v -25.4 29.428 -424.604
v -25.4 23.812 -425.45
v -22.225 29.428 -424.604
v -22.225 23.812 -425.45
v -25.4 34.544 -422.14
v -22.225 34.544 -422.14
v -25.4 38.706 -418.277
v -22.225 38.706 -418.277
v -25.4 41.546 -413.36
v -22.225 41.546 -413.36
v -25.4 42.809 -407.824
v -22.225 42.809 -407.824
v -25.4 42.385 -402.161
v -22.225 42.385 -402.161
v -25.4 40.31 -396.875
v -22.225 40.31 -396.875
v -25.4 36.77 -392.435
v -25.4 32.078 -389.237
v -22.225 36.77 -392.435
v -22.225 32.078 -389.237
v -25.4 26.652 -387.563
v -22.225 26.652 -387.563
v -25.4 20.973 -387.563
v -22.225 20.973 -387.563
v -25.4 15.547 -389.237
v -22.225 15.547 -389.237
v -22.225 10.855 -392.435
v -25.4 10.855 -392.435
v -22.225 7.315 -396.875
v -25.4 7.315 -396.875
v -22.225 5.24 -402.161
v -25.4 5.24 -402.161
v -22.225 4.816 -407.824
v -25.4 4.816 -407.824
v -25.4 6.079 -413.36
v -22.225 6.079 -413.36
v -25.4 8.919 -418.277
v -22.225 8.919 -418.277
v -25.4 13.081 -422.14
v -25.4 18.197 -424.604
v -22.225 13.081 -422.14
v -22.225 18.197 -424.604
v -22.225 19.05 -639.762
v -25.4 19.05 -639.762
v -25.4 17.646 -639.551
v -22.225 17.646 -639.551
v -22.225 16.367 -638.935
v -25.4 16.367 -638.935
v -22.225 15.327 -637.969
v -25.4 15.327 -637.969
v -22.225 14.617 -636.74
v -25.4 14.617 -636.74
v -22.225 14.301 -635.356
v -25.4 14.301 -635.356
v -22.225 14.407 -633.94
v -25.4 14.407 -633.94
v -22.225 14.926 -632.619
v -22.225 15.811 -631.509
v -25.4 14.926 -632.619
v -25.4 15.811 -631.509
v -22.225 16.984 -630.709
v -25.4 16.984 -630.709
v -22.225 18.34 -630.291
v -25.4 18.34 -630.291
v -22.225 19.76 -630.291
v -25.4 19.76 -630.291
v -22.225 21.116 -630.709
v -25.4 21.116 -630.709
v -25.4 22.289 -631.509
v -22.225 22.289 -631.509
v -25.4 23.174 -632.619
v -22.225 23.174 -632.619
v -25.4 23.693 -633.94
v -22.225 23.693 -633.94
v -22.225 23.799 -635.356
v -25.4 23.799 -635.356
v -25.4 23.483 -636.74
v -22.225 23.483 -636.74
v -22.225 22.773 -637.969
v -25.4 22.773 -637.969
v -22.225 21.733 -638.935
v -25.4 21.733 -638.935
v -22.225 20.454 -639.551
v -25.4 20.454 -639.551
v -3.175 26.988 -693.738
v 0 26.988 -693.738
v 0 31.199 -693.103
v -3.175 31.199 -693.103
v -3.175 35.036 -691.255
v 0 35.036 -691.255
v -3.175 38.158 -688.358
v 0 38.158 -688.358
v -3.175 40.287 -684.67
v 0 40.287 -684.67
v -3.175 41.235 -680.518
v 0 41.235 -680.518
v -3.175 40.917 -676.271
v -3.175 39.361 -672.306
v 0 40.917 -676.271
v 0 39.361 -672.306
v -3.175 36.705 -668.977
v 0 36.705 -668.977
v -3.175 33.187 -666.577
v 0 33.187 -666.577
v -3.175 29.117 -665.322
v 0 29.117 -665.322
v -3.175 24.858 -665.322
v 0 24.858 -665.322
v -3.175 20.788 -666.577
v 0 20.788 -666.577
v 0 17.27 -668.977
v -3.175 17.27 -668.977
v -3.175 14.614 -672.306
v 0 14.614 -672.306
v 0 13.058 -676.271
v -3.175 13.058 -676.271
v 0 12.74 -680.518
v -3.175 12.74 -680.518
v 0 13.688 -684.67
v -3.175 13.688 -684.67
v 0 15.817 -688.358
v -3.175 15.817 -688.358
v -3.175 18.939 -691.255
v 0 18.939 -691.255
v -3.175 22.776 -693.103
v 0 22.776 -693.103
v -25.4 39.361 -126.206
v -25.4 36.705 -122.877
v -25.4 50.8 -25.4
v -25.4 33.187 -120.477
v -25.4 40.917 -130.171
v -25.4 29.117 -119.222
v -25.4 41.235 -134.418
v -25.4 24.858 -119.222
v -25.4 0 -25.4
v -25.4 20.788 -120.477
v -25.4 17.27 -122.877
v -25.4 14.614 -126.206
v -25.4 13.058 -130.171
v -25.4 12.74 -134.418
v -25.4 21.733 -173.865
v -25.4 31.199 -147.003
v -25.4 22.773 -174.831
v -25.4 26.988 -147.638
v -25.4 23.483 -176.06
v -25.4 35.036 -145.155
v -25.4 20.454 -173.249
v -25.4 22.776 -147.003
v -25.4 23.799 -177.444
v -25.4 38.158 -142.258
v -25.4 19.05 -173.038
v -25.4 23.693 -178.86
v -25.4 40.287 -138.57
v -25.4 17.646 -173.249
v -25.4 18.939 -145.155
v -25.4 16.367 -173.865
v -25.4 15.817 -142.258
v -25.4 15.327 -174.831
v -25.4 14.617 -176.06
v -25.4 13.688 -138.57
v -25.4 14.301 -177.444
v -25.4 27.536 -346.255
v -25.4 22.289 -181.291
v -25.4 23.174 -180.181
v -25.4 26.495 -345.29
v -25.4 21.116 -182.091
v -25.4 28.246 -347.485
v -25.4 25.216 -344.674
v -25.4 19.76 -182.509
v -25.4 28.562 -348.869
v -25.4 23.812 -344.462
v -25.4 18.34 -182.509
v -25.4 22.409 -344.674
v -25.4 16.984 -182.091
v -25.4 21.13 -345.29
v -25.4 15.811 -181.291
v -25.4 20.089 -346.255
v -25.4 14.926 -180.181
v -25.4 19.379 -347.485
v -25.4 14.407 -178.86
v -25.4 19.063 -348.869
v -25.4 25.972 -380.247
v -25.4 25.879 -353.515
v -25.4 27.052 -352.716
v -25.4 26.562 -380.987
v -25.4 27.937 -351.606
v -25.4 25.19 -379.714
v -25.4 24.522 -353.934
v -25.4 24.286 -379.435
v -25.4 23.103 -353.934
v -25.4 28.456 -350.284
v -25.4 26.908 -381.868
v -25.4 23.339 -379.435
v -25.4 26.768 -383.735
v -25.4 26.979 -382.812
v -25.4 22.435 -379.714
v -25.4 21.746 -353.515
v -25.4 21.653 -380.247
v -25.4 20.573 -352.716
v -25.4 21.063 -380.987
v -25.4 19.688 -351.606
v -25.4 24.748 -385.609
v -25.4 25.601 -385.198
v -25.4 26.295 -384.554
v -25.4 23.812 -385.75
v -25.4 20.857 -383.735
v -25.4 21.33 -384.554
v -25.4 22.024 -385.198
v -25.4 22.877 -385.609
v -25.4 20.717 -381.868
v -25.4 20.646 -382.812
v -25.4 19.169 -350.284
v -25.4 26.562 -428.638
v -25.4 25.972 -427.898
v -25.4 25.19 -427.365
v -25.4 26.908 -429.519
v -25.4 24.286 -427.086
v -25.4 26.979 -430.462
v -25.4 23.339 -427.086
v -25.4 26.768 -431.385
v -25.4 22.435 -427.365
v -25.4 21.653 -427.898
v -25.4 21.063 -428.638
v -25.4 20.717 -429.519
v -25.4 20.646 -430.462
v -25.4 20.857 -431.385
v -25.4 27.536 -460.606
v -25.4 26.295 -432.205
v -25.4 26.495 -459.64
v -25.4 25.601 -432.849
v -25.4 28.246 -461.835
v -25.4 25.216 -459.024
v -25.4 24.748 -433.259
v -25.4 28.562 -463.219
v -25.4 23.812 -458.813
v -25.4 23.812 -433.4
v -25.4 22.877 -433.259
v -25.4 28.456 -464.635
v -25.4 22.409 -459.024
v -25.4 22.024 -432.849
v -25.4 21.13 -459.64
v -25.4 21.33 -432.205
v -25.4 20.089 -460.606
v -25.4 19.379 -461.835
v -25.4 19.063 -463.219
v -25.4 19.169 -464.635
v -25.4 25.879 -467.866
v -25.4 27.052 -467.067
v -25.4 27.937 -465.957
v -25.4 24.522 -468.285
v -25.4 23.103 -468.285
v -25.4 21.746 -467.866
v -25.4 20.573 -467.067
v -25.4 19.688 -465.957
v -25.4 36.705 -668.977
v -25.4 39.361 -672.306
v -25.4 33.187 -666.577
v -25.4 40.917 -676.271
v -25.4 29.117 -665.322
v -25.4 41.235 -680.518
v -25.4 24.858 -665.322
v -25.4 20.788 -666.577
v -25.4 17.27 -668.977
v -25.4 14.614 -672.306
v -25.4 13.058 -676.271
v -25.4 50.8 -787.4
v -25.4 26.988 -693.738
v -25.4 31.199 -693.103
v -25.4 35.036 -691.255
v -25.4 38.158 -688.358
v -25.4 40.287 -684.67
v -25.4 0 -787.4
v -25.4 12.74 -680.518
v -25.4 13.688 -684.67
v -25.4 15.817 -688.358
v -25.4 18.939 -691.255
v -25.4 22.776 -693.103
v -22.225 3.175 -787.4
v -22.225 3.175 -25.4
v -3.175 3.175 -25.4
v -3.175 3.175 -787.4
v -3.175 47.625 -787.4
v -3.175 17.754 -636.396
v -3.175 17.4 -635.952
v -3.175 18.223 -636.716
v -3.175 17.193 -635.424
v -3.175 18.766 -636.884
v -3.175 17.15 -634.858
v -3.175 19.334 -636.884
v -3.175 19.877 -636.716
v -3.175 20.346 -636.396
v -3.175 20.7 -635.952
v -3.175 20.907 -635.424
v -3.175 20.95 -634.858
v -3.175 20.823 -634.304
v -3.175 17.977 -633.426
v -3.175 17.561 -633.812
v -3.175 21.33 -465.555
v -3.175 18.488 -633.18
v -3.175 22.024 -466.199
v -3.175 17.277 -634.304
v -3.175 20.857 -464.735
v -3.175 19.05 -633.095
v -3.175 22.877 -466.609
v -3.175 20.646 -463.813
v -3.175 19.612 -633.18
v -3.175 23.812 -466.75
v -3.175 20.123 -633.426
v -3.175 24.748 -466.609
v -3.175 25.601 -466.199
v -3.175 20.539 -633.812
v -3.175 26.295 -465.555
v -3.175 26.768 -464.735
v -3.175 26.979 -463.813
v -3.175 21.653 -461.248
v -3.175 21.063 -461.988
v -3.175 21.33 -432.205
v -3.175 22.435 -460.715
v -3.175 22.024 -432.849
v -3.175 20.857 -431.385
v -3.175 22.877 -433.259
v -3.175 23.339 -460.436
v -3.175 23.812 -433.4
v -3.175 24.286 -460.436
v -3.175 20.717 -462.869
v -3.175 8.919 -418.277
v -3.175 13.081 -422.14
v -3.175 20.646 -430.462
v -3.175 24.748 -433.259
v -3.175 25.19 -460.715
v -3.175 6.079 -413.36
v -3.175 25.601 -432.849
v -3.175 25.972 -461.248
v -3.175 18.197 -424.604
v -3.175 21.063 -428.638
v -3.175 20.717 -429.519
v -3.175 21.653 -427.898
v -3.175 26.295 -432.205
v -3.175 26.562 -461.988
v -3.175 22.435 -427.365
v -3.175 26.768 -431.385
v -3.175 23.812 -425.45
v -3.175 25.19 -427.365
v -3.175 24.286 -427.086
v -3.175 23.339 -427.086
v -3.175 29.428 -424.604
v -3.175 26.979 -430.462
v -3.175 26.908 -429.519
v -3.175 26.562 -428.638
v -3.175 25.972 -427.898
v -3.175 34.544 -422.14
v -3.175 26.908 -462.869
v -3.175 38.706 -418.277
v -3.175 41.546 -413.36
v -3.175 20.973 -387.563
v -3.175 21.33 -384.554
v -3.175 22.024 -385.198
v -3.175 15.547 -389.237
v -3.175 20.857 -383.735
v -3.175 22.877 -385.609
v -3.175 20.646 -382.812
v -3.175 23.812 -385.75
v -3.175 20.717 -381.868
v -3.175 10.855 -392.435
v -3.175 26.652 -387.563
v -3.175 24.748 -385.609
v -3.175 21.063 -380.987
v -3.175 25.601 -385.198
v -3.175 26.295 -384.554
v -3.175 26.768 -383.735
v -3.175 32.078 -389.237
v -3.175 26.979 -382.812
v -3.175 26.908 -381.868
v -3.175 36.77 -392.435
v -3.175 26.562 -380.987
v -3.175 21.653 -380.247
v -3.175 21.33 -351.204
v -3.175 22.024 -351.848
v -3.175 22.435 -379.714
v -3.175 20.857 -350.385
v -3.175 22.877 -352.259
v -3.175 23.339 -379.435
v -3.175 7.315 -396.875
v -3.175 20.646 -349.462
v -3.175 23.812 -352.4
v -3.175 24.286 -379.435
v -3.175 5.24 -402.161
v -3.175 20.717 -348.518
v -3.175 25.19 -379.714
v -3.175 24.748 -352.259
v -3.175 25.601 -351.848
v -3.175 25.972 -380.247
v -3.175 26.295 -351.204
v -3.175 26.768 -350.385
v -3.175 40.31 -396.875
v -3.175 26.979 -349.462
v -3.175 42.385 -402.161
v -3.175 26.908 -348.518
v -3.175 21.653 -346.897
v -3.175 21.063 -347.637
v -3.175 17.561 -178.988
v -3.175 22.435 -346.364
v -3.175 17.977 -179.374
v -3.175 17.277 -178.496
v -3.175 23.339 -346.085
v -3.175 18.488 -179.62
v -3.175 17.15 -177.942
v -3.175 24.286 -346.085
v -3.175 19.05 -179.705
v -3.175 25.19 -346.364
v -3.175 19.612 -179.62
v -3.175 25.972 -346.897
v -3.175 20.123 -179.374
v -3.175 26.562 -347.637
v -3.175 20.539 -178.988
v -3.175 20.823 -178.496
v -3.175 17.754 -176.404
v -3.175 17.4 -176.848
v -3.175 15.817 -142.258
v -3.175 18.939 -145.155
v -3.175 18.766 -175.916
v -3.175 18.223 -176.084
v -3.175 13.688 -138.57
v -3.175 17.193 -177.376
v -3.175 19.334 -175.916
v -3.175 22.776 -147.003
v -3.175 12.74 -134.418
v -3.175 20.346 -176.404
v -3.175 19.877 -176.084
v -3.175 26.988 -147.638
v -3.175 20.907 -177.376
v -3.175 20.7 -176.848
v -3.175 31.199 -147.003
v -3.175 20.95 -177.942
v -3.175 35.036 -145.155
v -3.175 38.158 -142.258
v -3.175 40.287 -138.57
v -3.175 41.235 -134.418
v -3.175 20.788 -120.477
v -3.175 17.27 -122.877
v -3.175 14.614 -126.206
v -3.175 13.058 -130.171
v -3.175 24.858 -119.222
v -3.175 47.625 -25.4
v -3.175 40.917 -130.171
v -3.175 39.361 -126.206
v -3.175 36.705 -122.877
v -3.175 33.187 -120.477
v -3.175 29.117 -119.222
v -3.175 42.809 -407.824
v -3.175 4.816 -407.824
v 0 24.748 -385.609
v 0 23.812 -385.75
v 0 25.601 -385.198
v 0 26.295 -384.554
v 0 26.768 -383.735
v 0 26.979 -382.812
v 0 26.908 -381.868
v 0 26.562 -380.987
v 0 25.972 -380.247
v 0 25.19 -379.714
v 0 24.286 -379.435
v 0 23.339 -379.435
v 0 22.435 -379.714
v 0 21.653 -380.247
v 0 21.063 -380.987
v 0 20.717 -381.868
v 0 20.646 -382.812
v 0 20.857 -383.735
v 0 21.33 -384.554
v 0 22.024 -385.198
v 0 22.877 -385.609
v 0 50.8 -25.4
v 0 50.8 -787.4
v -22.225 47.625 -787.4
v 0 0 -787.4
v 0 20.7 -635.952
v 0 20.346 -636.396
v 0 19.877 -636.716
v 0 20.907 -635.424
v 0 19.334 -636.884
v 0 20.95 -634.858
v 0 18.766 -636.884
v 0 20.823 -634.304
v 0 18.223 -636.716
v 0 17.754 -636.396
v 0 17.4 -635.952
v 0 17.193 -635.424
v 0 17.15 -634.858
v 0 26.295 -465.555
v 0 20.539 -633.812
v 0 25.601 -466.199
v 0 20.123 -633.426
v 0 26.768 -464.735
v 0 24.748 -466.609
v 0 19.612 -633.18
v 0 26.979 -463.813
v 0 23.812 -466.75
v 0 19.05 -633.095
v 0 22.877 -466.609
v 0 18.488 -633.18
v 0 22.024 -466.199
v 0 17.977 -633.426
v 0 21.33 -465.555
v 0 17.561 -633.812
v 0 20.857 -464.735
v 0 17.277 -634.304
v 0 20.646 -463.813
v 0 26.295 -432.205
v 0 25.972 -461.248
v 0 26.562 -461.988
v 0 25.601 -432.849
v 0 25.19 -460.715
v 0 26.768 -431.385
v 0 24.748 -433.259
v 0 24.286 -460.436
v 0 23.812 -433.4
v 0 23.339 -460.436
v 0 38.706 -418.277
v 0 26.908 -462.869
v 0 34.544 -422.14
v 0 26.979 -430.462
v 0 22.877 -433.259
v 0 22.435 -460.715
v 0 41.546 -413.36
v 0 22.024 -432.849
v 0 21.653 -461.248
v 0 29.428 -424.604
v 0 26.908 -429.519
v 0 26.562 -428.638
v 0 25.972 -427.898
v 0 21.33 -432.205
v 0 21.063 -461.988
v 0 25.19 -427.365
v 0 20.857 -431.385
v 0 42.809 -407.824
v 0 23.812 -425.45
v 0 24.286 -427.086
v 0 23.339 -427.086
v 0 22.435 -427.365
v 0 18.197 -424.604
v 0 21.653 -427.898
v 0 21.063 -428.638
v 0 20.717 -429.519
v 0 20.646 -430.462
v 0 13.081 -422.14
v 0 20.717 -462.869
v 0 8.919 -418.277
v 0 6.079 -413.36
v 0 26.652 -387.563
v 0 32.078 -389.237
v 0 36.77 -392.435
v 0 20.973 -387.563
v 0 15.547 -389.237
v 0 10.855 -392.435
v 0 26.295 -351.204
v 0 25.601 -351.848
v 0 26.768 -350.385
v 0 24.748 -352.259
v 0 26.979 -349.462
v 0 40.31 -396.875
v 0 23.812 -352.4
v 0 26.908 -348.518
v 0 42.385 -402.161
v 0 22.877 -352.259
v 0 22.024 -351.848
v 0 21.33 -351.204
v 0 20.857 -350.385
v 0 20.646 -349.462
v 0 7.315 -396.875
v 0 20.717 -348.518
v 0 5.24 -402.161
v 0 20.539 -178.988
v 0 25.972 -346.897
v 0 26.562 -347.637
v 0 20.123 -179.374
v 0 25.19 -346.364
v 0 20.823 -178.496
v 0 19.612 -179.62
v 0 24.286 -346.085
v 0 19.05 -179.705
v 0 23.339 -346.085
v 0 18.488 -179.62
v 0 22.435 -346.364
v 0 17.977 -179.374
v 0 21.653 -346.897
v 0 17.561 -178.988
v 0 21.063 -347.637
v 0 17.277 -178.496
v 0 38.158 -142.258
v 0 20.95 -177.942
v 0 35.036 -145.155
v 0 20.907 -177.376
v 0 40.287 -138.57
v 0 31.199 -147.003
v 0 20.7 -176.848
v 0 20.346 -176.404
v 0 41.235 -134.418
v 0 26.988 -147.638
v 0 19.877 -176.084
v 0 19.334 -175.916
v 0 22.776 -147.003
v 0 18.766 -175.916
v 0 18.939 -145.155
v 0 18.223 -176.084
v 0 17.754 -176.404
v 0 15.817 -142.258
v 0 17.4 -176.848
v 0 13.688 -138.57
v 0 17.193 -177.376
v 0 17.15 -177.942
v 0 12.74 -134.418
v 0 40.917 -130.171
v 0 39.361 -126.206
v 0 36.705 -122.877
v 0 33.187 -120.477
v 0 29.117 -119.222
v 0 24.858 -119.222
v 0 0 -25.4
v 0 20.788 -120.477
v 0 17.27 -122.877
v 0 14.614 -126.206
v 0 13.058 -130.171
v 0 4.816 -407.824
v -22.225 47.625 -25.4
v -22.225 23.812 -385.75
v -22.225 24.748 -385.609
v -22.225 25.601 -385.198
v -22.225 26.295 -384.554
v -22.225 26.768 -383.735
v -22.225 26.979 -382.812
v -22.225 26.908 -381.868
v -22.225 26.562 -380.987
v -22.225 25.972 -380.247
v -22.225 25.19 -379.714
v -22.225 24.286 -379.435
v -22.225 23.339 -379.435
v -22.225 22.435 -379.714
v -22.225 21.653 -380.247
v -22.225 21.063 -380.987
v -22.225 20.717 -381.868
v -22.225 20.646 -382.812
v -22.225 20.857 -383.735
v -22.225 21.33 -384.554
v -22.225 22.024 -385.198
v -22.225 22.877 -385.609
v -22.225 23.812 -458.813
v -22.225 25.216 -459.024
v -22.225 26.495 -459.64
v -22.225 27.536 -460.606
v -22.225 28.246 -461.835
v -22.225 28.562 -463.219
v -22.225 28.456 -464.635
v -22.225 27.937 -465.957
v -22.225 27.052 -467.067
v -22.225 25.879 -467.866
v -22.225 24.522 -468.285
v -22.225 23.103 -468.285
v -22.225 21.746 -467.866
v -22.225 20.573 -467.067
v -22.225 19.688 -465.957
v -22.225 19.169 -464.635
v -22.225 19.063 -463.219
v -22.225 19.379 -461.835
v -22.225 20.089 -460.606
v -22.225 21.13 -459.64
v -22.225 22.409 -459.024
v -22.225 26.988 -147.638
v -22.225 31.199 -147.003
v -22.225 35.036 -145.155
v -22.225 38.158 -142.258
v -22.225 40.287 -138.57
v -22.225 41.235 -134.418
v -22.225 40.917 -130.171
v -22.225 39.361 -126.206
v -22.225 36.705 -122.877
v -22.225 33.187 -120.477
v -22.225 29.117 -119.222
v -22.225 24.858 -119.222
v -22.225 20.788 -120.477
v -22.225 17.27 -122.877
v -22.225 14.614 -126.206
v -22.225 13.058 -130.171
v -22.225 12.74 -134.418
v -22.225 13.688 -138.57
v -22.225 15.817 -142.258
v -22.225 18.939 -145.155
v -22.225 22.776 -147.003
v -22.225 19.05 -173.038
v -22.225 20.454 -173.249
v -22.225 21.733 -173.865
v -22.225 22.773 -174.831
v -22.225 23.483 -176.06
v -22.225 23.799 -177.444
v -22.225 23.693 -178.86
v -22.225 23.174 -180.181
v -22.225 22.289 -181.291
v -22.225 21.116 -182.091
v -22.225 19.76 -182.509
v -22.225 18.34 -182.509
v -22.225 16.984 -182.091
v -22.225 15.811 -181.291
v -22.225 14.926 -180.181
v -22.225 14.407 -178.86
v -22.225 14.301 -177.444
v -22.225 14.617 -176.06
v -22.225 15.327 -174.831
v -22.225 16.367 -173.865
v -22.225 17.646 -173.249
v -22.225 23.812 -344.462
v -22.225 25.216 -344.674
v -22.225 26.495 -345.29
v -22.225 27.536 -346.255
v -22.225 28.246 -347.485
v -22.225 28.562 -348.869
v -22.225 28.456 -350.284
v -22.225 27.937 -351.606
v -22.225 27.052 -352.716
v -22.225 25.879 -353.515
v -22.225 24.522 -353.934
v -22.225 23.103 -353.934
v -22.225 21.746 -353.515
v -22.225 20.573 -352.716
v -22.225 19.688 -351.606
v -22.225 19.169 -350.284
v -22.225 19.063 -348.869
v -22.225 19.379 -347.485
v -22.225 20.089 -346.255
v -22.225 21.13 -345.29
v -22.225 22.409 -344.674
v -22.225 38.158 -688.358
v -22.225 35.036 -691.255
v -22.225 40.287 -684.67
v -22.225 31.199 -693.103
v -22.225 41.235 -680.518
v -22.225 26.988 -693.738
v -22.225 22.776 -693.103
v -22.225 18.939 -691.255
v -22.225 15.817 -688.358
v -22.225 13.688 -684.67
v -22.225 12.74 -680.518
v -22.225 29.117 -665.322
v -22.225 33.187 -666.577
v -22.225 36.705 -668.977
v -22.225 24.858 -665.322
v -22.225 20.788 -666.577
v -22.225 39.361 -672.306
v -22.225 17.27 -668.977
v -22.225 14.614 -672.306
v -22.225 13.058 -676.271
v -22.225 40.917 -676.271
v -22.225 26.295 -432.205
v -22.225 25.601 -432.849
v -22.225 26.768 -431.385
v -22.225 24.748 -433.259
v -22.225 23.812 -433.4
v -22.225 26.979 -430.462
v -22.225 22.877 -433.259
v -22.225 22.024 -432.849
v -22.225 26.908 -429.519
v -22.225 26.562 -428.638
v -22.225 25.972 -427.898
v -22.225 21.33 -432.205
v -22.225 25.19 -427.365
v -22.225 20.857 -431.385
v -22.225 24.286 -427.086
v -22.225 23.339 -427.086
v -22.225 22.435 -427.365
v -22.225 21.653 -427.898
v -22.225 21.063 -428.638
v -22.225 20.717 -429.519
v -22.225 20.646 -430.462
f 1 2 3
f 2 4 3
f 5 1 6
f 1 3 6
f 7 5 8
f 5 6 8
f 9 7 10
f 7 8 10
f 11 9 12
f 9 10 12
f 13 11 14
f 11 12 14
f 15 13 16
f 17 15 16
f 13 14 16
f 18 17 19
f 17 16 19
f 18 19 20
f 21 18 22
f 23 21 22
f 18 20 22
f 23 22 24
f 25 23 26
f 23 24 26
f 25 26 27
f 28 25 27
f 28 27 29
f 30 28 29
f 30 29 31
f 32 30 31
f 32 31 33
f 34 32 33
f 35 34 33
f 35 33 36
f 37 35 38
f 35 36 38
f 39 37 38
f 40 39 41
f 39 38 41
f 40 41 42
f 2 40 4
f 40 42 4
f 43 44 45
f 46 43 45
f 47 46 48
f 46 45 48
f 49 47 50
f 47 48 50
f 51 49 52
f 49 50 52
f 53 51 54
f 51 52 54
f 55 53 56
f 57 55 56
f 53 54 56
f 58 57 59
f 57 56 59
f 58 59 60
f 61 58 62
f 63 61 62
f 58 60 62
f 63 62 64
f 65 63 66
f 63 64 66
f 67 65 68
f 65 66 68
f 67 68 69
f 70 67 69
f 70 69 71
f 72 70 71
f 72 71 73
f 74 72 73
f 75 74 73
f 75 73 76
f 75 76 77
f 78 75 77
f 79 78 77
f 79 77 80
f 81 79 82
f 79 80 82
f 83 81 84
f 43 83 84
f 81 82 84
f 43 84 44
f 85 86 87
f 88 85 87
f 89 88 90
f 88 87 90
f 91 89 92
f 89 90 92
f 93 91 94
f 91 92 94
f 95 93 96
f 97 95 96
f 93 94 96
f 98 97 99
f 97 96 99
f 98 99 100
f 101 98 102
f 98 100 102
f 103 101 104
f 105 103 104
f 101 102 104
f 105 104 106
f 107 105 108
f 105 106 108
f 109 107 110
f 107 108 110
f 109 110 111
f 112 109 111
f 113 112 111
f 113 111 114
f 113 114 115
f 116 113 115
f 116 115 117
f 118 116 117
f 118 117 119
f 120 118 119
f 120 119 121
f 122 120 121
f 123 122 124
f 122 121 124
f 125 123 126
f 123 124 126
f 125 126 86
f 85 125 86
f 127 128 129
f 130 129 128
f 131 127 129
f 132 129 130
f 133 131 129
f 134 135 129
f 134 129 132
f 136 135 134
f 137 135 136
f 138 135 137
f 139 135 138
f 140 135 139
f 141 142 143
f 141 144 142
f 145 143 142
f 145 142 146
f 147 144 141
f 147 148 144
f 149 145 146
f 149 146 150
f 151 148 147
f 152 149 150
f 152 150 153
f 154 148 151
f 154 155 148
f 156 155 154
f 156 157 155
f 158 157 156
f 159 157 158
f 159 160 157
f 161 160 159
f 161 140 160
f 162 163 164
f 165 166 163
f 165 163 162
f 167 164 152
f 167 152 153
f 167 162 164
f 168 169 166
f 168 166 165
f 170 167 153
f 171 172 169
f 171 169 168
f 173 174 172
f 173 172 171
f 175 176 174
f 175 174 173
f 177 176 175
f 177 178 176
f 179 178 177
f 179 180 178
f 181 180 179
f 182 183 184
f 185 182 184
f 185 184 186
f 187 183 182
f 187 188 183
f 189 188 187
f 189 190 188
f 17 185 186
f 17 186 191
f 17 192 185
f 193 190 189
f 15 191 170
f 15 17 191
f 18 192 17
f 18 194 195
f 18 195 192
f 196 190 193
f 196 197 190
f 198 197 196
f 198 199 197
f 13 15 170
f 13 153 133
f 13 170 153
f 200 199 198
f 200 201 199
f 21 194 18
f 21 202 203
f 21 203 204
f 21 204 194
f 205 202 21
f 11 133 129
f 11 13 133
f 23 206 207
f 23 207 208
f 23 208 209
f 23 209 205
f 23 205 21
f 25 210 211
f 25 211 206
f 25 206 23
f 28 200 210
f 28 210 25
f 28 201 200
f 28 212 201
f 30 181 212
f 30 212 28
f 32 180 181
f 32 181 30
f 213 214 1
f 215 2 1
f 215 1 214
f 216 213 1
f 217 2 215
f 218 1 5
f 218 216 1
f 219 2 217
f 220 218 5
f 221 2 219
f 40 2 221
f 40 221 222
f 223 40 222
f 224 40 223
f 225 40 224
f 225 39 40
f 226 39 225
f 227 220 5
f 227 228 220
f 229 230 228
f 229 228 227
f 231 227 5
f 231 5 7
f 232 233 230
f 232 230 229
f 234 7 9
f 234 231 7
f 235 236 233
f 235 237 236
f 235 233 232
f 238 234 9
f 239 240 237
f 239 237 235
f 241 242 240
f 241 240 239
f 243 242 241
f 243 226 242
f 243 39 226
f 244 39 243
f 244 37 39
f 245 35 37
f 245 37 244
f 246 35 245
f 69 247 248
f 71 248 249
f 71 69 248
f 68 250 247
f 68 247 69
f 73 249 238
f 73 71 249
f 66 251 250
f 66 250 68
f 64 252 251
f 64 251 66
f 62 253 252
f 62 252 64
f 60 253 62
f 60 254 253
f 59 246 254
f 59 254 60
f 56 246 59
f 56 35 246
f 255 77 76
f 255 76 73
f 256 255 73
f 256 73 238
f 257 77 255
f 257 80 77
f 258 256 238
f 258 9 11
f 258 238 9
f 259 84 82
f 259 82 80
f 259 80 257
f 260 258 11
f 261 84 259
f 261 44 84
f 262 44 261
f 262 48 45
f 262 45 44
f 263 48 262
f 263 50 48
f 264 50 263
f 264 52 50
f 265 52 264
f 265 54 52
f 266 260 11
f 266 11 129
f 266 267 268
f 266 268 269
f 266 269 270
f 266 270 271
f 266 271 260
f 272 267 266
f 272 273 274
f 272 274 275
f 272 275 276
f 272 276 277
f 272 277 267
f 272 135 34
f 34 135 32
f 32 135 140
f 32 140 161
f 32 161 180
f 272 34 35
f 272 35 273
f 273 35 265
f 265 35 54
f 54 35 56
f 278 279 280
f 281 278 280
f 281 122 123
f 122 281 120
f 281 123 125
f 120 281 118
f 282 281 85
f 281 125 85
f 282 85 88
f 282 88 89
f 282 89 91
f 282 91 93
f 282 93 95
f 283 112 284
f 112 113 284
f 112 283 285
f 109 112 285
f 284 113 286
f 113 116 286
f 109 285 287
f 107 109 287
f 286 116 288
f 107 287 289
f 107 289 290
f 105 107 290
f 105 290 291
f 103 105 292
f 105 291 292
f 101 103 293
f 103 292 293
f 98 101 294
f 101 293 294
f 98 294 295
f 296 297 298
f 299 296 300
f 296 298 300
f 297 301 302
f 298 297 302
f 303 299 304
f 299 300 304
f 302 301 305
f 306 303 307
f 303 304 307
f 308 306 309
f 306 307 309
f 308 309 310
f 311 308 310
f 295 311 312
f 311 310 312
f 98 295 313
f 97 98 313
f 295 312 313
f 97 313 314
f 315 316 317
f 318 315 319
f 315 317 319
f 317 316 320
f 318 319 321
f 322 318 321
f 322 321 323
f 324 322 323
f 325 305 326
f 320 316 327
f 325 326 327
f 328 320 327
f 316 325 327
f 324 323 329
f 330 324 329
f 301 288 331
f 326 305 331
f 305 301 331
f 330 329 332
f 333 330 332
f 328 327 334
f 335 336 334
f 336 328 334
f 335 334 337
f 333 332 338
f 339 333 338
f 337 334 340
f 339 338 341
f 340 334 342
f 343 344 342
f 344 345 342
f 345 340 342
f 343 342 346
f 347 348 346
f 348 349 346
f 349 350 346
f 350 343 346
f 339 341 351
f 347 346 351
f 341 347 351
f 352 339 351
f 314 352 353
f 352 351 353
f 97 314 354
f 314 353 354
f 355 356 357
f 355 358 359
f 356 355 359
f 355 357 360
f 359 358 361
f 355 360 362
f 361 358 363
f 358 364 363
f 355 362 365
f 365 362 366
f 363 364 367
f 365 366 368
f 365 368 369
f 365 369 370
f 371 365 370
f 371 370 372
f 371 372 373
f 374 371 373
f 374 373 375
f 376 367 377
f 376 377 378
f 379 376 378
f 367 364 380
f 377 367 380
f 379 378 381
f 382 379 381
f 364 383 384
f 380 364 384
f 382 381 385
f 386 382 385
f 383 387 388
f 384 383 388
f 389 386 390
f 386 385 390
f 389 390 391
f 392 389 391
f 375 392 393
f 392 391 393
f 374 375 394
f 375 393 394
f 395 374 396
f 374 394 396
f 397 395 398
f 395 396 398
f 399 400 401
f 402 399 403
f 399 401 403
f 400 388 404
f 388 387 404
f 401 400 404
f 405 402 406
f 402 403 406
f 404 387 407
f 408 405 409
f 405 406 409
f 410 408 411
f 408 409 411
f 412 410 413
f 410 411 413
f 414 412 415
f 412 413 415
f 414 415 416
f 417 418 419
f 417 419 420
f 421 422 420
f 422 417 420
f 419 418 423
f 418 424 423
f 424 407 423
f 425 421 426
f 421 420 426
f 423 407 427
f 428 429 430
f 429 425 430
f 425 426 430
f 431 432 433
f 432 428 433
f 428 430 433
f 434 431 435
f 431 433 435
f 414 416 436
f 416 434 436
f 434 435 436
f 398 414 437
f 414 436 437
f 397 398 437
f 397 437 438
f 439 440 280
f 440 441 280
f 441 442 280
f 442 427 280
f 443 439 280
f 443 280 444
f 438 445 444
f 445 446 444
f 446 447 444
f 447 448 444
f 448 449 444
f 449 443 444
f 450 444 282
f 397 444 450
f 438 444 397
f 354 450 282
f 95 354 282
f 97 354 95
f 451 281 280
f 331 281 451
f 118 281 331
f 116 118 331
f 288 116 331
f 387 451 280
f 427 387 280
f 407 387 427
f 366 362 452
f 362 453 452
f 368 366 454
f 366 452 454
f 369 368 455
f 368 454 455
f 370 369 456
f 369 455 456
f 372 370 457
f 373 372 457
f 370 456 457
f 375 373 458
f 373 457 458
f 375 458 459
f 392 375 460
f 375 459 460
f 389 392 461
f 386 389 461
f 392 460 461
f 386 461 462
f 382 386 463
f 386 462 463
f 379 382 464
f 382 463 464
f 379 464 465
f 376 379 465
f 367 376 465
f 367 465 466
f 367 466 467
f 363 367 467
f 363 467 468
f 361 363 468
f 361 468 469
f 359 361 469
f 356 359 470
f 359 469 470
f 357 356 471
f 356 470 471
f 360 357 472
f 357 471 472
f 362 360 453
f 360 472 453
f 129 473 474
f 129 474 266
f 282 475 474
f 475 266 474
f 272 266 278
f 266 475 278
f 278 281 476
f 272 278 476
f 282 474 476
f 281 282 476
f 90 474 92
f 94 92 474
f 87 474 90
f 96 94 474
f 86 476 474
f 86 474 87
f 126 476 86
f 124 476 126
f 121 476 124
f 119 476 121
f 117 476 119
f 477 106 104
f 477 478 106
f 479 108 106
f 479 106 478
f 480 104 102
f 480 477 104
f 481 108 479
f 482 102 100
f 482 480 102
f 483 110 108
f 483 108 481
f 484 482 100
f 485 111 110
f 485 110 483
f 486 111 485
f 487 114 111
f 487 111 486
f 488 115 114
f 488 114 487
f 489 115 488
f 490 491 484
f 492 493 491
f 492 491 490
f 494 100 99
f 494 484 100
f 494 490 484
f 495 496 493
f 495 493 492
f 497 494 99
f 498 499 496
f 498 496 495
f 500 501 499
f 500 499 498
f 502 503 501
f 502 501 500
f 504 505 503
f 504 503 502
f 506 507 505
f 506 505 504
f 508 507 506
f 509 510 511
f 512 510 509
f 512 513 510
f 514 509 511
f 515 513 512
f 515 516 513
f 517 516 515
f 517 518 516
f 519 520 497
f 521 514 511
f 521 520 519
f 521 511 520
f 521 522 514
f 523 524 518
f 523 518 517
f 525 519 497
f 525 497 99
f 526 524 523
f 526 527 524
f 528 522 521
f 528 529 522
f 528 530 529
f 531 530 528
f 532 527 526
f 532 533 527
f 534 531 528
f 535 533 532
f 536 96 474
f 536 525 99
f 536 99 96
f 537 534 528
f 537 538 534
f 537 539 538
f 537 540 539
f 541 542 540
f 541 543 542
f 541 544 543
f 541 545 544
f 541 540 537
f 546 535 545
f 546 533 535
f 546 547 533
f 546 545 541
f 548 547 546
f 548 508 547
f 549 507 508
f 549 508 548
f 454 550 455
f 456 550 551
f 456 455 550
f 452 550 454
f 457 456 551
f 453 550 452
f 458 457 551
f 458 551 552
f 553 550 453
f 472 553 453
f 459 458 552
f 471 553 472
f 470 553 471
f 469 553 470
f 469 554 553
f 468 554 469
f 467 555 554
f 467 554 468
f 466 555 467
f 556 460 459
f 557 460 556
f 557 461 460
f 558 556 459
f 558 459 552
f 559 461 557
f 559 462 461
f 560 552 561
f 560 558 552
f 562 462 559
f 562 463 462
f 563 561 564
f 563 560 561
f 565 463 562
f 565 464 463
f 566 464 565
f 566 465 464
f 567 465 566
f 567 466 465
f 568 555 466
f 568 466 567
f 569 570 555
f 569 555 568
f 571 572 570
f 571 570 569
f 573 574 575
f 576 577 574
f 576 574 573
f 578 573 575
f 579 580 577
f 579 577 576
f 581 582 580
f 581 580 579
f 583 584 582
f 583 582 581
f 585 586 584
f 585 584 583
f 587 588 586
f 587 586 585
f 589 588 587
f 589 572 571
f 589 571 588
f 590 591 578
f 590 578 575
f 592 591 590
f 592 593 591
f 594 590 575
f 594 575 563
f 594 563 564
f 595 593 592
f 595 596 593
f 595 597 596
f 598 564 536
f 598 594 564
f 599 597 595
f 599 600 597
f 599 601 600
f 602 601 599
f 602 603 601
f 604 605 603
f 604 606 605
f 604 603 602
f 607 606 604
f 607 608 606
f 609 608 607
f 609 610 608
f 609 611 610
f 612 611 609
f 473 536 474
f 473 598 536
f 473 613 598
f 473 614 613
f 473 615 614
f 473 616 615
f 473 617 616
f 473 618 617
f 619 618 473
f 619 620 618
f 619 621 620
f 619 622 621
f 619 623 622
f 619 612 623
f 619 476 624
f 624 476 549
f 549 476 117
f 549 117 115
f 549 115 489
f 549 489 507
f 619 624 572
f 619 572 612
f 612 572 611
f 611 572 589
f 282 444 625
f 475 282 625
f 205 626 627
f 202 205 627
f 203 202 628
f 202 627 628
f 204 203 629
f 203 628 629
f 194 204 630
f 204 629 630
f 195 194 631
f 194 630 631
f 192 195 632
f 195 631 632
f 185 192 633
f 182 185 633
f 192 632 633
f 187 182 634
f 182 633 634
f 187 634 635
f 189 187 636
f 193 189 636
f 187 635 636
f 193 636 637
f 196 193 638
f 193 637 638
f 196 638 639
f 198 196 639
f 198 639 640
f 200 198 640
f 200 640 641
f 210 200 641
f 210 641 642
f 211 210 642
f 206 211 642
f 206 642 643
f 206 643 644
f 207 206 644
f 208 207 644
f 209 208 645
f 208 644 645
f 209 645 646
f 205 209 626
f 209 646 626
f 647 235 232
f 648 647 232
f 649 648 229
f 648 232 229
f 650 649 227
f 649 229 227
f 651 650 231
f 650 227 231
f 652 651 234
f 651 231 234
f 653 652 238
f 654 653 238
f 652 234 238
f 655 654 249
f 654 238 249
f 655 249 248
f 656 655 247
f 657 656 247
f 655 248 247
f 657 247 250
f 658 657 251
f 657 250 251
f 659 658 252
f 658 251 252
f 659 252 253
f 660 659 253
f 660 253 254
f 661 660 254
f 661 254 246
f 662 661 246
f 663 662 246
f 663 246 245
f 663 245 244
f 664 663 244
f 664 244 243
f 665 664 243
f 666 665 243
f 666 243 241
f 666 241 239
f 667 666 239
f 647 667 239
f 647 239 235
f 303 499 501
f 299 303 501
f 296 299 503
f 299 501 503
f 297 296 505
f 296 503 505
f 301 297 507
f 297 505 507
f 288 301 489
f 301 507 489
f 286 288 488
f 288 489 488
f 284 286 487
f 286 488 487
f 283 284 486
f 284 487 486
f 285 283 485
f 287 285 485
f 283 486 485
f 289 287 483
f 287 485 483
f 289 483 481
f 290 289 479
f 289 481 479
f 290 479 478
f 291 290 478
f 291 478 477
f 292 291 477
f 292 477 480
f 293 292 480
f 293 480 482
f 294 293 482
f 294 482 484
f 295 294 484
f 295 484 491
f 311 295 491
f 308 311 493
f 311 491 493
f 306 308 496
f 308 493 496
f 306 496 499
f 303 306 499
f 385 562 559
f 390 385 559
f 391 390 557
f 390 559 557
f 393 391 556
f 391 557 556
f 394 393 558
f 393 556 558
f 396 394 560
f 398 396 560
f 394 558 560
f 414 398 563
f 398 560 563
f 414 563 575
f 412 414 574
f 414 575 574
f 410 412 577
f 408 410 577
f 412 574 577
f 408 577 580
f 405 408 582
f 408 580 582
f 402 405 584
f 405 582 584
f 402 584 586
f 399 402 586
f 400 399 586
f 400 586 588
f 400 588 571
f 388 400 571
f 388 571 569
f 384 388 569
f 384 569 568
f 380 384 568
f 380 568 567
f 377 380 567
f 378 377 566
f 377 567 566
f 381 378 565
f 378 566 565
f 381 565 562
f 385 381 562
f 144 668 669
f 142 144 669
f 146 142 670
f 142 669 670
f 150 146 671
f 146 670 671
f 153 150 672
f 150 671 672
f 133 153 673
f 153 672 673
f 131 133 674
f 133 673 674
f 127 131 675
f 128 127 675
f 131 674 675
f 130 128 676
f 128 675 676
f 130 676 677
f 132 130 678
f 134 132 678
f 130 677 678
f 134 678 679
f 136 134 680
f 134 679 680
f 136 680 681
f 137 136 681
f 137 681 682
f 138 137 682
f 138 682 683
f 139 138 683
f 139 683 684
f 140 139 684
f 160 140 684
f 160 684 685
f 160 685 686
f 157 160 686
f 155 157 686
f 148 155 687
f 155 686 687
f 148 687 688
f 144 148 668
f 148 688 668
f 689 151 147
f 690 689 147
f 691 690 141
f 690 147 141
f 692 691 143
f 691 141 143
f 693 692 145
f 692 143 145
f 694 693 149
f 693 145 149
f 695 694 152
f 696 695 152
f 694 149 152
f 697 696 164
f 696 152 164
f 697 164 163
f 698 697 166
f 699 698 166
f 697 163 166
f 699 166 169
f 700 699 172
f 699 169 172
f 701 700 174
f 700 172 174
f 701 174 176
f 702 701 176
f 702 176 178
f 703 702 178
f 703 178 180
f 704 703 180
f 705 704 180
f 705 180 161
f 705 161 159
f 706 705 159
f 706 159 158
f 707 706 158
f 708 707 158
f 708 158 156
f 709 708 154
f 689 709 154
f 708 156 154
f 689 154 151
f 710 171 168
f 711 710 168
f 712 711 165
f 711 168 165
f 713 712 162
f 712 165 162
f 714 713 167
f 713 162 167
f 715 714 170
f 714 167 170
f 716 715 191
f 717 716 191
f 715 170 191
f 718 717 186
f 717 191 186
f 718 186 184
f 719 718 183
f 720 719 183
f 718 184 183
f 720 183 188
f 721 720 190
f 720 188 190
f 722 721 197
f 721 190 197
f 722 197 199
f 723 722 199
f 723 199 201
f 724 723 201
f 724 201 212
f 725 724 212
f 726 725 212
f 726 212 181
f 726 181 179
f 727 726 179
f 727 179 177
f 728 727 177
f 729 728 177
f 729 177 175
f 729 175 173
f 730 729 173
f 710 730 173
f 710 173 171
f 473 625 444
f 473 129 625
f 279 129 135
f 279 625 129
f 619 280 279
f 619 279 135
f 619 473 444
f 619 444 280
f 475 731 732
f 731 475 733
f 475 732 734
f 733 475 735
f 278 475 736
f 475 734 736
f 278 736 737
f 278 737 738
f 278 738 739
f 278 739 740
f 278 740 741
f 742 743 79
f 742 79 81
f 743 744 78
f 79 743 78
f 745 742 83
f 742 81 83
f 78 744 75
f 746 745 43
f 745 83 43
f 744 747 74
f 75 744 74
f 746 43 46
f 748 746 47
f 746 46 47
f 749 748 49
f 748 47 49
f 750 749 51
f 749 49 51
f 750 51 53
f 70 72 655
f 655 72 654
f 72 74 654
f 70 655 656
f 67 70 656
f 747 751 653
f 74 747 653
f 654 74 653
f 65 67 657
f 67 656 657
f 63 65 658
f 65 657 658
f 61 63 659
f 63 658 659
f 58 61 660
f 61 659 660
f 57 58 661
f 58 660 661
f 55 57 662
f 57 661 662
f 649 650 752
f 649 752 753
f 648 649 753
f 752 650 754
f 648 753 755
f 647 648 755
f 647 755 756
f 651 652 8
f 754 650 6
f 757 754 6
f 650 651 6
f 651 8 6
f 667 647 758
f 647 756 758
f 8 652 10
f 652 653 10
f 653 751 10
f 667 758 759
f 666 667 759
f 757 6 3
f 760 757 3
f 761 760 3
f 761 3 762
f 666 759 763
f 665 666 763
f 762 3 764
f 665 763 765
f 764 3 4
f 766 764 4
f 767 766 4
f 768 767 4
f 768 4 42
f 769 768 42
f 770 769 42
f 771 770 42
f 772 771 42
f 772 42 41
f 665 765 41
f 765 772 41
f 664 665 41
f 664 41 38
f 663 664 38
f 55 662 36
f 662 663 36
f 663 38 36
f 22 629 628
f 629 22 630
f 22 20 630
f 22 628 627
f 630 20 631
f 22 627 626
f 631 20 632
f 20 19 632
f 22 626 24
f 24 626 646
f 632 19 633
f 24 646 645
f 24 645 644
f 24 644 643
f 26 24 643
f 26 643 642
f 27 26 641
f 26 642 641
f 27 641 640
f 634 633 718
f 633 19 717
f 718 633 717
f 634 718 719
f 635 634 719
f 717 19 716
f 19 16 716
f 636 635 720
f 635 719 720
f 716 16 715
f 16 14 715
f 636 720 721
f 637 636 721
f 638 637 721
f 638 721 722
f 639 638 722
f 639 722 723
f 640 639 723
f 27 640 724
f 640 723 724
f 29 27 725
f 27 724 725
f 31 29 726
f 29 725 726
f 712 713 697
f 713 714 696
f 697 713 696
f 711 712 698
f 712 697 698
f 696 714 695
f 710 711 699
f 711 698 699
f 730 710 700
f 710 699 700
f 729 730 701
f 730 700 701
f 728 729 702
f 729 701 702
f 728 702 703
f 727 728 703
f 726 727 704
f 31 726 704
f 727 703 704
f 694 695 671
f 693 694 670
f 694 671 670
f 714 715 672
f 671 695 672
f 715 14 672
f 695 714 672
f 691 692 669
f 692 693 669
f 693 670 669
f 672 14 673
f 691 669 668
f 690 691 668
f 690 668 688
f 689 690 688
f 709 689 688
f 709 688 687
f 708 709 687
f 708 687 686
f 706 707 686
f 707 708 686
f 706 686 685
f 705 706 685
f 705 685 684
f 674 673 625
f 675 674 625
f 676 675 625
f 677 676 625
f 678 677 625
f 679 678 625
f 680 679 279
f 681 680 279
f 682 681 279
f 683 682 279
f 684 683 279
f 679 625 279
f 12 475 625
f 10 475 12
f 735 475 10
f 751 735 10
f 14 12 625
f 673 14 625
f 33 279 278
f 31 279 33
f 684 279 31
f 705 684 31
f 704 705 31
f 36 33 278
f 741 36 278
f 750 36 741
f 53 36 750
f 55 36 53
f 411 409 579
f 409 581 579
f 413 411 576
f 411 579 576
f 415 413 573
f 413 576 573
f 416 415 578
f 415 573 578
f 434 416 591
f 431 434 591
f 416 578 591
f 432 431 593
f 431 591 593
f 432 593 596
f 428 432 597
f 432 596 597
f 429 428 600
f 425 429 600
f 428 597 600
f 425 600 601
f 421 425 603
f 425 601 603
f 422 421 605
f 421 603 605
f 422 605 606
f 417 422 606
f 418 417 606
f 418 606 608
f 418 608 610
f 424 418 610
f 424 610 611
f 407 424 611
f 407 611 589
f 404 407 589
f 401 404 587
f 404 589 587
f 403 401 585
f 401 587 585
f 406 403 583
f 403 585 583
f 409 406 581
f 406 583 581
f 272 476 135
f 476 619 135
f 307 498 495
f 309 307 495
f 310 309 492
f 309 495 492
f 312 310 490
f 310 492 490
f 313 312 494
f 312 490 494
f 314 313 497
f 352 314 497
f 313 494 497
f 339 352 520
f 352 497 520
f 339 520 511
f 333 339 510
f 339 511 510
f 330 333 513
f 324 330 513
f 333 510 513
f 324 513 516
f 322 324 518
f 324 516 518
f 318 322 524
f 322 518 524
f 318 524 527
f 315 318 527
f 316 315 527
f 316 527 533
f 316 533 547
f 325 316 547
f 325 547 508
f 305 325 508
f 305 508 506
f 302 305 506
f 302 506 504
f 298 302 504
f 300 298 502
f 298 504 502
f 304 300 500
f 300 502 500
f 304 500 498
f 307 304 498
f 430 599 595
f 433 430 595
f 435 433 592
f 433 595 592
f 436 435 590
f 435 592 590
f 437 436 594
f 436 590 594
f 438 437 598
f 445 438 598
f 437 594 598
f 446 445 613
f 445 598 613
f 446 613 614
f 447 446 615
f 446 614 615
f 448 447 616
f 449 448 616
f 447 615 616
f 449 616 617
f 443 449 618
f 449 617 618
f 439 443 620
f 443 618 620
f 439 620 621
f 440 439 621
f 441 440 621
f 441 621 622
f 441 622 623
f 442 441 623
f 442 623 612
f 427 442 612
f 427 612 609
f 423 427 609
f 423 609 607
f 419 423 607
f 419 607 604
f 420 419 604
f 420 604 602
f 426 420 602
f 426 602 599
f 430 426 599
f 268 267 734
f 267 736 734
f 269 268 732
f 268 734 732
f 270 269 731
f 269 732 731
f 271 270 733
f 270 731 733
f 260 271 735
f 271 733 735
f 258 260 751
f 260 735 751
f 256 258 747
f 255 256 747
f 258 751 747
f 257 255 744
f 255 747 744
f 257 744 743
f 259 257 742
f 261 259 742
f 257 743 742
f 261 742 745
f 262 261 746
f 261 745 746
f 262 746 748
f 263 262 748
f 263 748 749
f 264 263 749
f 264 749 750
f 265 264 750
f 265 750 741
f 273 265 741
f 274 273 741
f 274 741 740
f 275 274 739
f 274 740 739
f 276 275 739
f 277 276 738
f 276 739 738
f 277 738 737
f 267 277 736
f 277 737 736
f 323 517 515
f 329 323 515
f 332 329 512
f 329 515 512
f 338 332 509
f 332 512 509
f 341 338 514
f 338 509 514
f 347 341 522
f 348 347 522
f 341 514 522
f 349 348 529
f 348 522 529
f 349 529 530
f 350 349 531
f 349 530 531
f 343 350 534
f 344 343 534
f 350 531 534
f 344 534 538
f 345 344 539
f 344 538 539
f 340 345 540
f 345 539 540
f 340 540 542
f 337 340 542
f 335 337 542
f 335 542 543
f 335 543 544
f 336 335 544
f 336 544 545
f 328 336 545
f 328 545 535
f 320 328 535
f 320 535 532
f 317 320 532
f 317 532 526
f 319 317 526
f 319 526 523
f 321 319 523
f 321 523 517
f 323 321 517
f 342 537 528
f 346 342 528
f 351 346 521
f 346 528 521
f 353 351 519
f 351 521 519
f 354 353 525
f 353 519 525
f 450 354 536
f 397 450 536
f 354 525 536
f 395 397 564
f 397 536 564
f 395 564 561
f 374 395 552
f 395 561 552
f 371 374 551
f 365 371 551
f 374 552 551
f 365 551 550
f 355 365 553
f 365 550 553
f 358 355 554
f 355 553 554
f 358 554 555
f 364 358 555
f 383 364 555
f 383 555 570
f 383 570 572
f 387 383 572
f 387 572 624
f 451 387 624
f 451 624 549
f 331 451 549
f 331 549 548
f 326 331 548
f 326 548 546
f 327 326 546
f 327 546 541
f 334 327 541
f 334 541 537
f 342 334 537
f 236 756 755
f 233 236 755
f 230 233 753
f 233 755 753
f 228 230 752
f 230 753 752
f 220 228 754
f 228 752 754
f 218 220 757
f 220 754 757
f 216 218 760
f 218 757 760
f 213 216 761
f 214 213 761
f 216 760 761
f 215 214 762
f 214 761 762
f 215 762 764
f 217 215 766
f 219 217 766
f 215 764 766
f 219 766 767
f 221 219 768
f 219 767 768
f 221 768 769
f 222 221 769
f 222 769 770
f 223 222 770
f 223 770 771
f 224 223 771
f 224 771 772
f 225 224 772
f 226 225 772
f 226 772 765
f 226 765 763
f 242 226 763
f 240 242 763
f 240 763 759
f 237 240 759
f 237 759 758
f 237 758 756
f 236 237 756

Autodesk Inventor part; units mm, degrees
ref_plane "YZ Plane" through (0, 0, 0) normal (1, 0, 0) x (0, 1, 0)
ref_plane "XZ Plane" through (0, 0, 0) normal (0, 1, 0) x (-1, 0, 0)
sketch "Sketch1" plane through (0, 0, 0) normal (0, 1, 0) x (-1, 0, 0)
  point P0 (0, 0)
sketch "Sketch2" plane through (0, 0, 0) normal (0, 1, 0) x (-1, 0, 0)
  line L0 (0, 0) -> (25.4, 0)
  line L1 (25.4, 0) -> (25.4, -812.8)
  line L2 (25.4, -812.8) -> (0, -812.8)
  line L3 (0, -812.8) -> (0, 0)
  dimension "d0" = 812.8
  dimension "d1" = 25.4
extrude "Extrusion1" add sketch "Sketch2" along normal blind 50.8
sketch "Sketch3" plane through (0, 0, 0) normal (1, 0, 0) x (0, 0, -1)
  circle A0 centre (133.35, 26.9875) radius 14.2875
  line L0 (0, 0) -> (0, 50.8) projected
  line L1 (0, 50.8) -> (812.8, 50.8) projected
  circle A1 centre (679.45, 26.9875) radius 14.2875
  line L2 (812.8, 0) -> (812.8, 50.8) projected
  line L3 (812.8, 0) -> (0, 0) projected
  circle A2 centre (406.4, 23.8125) radius 19.05
  point P0 (406.4, 50.8)
  point P1 (406.4, 0)
  point P2 (406.4, 0)
  dimension "d4" = 28.575
  dimension "d5" = 133.35
  dimension "d6" = 23.8125
  dimension "d7" = 28.575
  dimension "d8" = 133.35
  dimension "d9" = 26.9875
  dimension "d10" = 38.1
  dimension "d11" = 26.9875
extrude "Extrusion2" cut sketch "Sketch3" against normal through all contours A0 | A1 | A2
sketch "Sketch4" plane through (-25.4, 0, 0) normal (0, 0, 1) x (1, 0, 0)
  line L0 (0, 50.8) -> (25.4, 50.8) projected
  line L1 (25.4, 0) -> (25.4, 50.8) projected
  line L2 (25.4, 0) -> (0, 0) projected
  line L3 (0, 0) -> (0, 50.8) projected
  line L4 (22.225, 47.625) -> (3.175, 47.625)
  line L5 (3.175, 47.625) -> (3.175, 3.175)
  line L6 (3.175, 3.175) -> (22.225, 3.175)
  line L7 (22.225, 3.175) -> (22.225, 47.625)
  dimension "d15" = 3.175
extrude "Extrusion3" cut sketch "Sketch4" against normal up to surface (812.8 mm away) contours L7 L6 L5 L4
sketch "Sketch5" plane through (0, 0, 0) normal (1, 0, 0) x (0, 0, -1)
  circle A0 centre (679.45, 26.9875) radius 14.2875 projected
  circle A1 centre (133.35, 26.9875) radius 14.2875 projected
  circle A2 centre (406.4, 23.8125) radius 19.05 projected
  line L0 (812.8, 0) -> (0, 0) projected
  line L1 (812.8, 0) -> (812.8, 50.8) projected
  line L2 (0, 50.8) -> (812.8, 50.8) projected
  line L3 (0, 0) -> (0, 50.8) projected
  line L4 (0, 50.8) -> (25.4, 50.8)
  line L5 (25.4, 50.8) -> (25.4, 0)
  line L6 (25.4, 0) -> (0, 0)
  line L7 (0, 0) -> (0, 50.8)
  line L8 (812.8, 0) -> (812.8, 50.8) projected
  line L9 (812.8, 0) -> (0, 0) projected
  line L10 (812.8, 50.8) -> (787.4, 50.8)
  line L11 (787.4, 50.8) -> (787.4, 0)
  line L12 (787.4, 0) -> (812.8, 0)
  line L13 (812.8, 0) -> (812.8, 50.8)
  dimension "d18" = 25.4
  dimension "d19" = 25.4
  dimension "d59" = 28.575
extrude "Extrusion4" cut sketch "Sketch5" against normal blind 25.4 contours L0 L11 L2 L1 | L0 L3 L2 L5
sketch "Sketch8" plane through (0, 0, -25.4) normal (1, 0, 0) x (0, 0, -1)
  point P0 (-25.4, 0)
sketch "Sketch9" plane through (0, 0, -25.4) normal (1, 0, 0) x (0, 0, -1)
  circle A0 centre (404.8252, 23.8125) radius 3.175
  circle A1 centre (381, 23.8125) radius 19.05 projected
  line L0 (0, 50.8) -> (762, 50.8) projected
  circle A2 centre (357.1748, 23.8125) radius 3.175
  circle A3 centre (438.1754, 23.8125) radius 3.175
  circle A4 centre (323.8246, 23.8125) radius 3.175
  point P0 (-25.4, 0)
  point P1 (257.298, 23.8125)
  dimension "d61" = 6.35
  dimension "d62" = 23.8252
  dimension "d64" = 6.35
  dimension "d65" = 23.8252
  dimension "d67" = 6.35
  dimension "d69" = 6.35
  dimension "d71" = 57.1754
  dimension "d72" = 57.1754
extrude "Extrusion6" cut sketch "Sketch9" against normal blind 25.4 contours A0 | A2 | A3 | A4
sketch "Sketch11" plane through (-25.4, 0, -787.4) normal (-1, 0, 0) x (0, 0, 1)
  circle A0 centre (438.1754, 23.8125) radius 4.7625
  circle A1 centre (381, 23.8125) radius 19.05 projected
  line L0 (0, 50.8) -> (762, 50.8) projected
  circle A2 centre (323.8246, 23.8125) radius 4.7625
  point P0 (787.4, 0)
  dimension "d85" = 9.525
  dimension "d86" = 57.1754
  dimension "d88" = 9.525
  dimension "d90" = 57.1754
extrude "Extrusion8" cut sketch "Sketch11" against normal blind 12.7 contours A0 | A2
sketch "Sketch12" plane through (-25.4, 0, -787.4) normal (-1, 0, 0) x (0, 0, 1)
  circle A0 centre (609.6, 19.05) radius 4.7625
  line L0 (762, 0) -> (0, 0) projected
  circle A1 centre (381, 23.8125) radius 19.05 projected
  circle A2 centre (654.05, 26.9875) radius 14.2875 projected
  point P0 (787.4, 0)
  dimension "d93" = 9.525
  dimension "d94" = 19.05
  dimension "d103" = 44.45
extrude "Extrusion9" cut sketch "Sketch12" against normal blind 12.7 contours A0
sketch "Sketch13" plane through (0, 0, -25.4) normal (1, 0, 0) x (0, 0, -1)
  circle A0 centre (152.4, 19.05) radius 1.905
  circle A1 centre (381, 23.8125) radius 19.05 projected
  line L0 (762, 0) -> (0, 0) projected
  circle A2 centre (107.95, 26.9875) radius 14.2875 projected
  point P0 (-25.4, 0)
  dimension "d98" = 3.81
  dimension "d100" = 19.05
  dimension "d104" = 44.45
extrude "Extrusion10" cut sketch "Sketch13" against normal blind 12.7 contours A0
ref_plane "Work Plane1" through (0, 0, -406.4) normal (0, 0, 1) x (1, 0, 0)
mirror "Mirror1" about plane through (0, 0, -406.4) normal (0, 0, 1) of "Extrusion10", "Extrusion9"
equation "\"d9\" = d11"
properties part number "2x1 20in Alluminum with Cal Drop.ver1-1111-2019"
